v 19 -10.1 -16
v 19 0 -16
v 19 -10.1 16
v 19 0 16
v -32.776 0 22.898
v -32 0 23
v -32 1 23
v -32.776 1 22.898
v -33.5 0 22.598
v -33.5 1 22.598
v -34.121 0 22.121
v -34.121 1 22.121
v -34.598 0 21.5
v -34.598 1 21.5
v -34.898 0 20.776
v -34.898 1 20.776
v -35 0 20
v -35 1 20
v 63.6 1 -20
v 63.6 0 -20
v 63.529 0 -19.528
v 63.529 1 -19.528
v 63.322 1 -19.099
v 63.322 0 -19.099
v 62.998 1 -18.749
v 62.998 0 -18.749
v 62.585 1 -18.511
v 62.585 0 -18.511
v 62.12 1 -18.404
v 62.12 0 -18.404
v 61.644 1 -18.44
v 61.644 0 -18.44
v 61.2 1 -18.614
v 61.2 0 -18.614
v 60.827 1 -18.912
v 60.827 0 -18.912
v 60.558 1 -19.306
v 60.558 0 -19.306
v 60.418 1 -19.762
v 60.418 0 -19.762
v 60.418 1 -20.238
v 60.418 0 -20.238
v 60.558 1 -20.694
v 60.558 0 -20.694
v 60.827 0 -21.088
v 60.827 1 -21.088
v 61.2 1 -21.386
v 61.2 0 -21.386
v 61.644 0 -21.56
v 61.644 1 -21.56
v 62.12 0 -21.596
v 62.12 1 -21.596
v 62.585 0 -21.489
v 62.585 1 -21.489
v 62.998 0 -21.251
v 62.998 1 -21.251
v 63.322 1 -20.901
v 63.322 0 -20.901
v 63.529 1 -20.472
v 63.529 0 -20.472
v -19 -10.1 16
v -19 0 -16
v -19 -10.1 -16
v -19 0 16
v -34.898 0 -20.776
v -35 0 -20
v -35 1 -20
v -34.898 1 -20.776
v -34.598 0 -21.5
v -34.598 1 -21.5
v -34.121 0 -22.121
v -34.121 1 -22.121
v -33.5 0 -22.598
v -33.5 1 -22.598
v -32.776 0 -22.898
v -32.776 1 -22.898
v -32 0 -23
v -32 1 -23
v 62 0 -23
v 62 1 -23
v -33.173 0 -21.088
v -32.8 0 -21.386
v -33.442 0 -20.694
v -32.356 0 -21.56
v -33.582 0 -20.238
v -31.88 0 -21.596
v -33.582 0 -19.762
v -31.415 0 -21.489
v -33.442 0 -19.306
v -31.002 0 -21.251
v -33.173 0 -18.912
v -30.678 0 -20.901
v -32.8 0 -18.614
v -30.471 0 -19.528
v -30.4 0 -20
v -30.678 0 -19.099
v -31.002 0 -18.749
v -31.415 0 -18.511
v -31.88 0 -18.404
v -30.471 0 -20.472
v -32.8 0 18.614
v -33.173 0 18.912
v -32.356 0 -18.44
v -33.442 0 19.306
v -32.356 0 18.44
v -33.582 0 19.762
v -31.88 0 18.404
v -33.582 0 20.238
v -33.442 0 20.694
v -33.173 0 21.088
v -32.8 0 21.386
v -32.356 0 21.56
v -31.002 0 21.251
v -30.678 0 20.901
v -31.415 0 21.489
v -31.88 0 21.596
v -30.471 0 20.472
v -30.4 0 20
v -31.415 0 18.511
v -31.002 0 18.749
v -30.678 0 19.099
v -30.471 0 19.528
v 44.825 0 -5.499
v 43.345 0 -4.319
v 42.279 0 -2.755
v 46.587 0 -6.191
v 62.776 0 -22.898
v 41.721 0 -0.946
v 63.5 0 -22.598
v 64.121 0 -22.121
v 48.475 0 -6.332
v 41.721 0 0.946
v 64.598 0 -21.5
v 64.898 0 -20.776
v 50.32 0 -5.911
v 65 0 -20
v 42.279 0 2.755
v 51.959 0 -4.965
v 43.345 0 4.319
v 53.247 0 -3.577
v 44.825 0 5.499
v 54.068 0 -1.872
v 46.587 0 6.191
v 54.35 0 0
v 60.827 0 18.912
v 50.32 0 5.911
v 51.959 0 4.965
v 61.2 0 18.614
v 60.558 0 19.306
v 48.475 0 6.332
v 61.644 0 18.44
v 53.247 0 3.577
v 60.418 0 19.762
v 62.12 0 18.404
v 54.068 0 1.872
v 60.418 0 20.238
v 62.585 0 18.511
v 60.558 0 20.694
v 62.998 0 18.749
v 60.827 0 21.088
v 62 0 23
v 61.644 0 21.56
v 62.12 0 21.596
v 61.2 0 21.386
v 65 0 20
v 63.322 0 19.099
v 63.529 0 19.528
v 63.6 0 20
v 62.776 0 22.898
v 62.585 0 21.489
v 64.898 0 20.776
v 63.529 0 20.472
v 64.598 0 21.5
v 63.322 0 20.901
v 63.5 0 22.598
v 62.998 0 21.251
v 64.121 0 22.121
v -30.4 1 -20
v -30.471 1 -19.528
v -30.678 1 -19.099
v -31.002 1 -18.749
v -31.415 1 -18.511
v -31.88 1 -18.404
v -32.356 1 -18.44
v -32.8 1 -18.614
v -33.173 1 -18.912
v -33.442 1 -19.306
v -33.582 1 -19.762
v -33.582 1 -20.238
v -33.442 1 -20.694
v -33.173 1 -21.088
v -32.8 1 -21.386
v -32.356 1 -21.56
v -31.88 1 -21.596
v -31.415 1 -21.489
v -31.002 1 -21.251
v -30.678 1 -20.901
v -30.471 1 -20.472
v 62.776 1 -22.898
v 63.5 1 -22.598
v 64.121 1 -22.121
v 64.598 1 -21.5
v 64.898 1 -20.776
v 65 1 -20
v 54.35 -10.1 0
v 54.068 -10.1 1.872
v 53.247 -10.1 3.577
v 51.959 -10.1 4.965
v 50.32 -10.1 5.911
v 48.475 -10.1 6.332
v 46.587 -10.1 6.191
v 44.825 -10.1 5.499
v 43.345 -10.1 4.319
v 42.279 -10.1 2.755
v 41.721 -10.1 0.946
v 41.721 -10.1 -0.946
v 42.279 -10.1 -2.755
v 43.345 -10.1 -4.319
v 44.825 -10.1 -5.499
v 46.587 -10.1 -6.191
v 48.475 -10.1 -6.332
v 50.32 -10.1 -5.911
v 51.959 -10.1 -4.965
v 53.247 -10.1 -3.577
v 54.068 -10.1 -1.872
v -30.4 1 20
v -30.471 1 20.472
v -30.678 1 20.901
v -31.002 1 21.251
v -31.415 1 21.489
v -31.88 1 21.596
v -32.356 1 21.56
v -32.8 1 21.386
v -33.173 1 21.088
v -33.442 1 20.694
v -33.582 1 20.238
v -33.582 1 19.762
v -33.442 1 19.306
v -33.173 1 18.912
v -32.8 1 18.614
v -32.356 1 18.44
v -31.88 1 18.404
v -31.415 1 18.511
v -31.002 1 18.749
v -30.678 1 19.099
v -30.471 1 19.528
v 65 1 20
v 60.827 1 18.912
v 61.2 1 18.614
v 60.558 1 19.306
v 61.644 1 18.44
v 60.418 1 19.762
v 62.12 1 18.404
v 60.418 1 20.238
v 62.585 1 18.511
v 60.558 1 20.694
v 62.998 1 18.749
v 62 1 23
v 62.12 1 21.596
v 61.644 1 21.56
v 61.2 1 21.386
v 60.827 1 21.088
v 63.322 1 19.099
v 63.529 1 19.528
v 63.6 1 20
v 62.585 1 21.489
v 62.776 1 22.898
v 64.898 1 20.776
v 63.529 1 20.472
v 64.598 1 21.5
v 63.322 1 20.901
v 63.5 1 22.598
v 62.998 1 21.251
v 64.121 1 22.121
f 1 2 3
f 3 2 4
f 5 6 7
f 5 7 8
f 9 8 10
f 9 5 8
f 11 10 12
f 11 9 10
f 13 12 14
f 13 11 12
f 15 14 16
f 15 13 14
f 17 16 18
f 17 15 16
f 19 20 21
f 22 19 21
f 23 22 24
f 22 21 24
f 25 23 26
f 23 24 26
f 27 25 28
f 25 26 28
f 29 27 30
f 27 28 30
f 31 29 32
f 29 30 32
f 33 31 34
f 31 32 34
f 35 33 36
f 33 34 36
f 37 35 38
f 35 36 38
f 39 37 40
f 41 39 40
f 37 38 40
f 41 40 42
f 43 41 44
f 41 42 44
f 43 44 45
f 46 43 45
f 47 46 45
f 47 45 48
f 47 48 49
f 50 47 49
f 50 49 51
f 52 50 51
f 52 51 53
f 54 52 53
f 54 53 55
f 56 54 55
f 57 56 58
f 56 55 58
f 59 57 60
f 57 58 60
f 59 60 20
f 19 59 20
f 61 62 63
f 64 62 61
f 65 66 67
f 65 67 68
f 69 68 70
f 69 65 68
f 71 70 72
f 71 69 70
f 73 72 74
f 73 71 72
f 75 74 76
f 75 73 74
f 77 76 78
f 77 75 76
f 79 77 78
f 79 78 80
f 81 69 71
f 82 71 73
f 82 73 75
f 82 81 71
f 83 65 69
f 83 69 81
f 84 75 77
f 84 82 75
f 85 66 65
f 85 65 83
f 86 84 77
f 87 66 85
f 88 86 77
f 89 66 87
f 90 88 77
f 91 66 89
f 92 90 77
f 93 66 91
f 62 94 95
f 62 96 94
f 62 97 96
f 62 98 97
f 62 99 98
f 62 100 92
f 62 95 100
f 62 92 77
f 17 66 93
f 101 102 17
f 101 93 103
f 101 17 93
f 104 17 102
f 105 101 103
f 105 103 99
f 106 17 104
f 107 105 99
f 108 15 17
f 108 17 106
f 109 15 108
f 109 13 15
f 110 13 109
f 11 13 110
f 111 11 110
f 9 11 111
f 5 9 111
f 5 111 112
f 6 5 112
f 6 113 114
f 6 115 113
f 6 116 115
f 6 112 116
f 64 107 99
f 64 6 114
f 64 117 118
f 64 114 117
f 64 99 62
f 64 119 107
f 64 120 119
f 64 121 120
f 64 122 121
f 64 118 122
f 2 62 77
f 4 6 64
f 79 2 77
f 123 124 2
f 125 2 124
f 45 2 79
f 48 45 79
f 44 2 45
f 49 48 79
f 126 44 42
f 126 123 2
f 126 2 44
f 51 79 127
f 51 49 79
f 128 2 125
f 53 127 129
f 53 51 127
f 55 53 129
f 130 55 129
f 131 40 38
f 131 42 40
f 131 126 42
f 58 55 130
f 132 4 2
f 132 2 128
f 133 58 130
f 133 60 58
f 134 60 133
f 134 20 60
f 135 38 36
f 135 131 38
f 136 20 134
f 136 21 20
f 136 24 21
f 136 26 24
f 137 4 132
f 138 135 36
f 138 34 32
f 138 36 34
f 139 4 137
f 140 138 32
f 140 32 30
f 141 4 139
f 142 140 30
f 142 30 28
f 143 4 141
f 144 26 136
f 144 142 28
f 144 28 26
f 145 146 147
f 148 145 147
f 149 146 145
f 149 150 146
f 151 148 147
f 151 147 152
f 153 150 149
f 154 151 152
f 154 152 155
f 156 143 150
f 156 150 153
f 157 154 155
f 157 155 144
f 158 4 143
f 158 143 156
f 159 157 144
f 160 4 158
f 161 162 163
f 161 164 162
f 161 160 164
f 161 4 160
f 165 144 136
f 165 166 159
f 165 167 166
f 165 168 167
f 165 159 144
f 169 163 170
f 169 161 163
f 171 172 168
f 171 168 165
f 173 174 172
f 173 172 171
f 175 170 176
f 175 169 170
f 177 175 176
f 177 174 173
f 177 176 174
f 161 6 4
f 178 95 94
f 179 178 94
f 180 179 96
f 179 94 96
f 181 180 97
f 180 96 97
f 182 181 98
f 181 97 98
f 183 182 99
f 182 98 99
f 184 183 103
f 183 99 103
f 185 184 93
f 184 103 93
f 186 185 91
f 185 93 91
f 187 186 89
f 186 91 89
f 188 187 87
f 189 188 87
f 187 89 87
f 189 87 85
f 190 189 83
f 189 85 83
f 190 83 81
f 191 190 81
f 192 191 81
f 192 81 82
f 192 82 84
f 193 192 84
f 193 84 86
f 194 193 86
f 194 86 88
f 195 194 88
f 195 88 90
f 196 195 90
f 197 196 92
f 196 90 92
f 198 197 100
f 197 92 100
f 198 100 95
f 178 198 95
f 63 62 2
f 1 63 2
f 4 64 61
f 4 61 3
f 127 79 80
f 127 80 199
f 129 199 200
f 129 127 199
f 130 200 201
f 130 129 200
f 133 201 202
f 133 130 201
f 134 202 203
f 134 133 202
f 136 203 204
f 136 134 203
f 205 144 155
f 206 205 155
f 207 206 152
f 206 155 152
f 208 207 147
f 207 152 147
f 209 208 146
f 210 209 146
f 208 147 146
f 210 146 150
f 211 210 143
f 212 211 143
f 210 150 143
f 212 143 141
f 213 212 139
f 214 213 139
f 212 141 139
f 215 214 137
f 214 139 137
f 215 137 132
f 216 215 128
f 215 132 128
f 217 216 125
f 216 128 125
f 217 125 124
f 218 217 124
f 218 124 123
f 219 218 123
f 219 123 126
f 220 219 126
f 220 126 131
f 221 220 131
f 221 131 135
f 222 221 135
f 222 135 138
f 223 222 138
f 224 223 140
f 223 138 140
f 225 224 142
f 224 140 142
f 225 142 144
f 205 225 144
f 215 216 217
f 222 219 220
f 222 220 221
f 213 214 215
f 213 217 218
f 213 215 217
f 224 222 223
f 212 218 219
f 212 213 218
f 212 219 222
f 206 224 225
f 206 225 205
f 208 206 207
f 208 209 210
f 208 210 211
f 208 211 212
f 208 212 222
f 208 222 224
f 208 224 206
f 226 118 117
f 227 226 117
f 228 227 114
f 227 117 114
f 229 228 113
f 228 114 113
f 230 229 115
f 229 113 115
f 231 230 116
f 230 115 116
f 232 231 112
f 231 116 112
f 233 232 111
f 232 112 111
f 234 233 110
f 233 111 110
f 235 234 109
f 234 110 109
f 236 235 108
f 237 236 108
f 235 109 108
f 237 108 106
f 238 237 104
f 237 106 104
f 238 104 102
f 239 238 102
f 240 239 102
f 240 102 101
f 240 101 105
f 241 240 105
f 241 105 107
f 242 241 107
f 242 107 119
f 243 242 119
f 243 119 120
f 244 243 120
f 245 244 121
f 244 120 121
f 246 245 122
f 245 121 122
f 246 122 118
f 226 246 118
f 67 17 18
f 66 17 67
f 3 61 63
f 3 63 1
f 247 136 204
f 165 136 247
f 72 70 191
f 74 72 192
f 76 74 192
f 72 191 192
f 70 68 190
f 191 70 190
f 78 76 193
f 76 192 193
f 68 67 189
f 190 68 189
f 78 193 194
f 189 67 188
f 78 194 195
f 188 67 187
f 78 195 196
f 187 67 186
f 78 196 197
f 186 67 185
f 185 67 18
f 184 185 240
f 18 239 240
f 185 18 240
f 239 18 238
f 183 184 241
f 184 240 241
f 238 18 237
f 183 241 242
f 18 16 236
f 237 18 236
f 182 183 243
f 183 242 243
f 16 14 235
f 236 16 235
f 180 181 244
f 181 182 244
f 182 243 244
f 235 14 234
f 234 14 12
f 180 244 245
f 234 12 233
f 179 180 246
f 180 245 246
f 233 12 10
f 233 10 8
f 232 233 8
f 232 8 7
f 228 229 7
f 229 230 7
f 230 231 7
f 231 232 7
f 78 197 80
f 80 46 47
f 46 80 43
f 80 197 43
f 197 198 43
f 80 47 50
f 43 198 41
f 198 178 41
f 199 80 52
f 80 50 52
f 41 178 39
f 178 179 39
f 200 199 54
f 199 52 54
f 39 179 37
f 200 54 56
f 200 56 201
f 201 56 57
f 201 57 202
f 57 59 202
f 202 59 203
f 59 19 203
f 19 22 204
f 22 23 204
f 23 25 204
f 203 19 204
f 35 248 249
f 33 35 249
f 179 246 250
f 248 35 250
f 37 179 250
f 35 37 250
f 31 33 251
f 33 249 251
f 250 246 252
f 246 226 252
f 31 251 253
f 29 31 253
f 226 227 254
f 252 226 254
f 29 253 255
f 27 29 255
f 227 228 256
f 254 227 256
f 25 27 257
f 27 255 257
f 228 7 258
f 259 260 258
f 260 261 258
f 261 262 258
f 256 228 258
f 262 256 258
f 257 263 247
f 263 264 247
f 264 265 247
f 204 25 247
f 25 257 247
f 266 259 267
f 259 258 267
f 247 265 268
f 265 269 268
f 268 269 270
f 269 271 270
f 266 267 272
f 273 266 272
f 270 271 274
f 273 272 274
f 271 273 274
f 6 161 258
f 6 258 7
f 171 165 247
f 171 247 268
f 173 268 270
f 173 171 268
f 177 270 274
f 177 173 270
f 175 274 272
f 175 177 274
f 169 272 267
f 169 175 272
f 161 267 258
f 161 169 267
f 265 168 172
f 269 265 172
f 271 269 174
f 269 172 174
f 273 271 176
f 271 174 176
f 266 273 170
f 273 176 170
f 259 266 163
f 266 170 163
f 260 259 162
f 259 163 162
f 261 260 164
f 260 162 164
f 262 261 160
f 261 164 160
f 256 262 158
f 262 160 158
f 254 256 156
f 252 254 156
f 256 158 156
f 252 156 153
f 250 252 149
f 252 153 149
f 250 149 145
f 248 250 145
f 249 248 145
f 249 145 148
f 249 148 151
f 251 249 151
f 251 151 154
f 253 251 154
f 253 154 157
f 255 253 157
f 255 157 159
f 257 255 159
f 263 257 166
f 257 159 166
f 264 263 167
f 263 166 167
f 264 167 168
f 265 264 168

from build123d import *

# Parameters (mm, degrees)
F0_W     = 38
F0_H     = 32
F1_DEPTH = 10.1
F0_R     = 1.6
F0_R_2   = 6.35
F2_DEPTH = 1
F3_DEPTH = 10.1


with BuildPart() as f1:
    # F0 (on Front) → F1 (new body)
    with BuildSketch(Plane.XZ):
        Rectangle(F0_W, F0_H)
    extrude(amount=F1_DEPTH)

    # F0 (on Front) → F2 (join)
    with BuildSketch(Plane.XZ):
        with BuildLine():
            ThreePointArc((-35, -20), (-34.12132, -22.12132), (-32, -23))
            Line((-32, -23), (62, -23))
            ThreePointArc((62, -23), (64.12132, -22.12132), (65, -20))
            Line((65, -20), (65, 20))
            ThreePointArc((65, 20), (64.12132, 22.12132), (62, 23))
            Line((62, 23), (-32, 23))
            ThreePointArc((-32, 23), (-34.12132, 22.12132), (-35, 20))
            Line((-35, 20), (-35, -20))
        make_face()
        with Locations((-32, -20)):
            Circle(F0_R, mode=Mode.SUBTRACT)
        with Locations((62, -20)):
            Circle(F0_R, mode=Mode.SUBTRACT)
        Rectangle(F0_W, F0_H, mode=Mode.SUBTRACT)
        with Locations((-32, 20)):
            Circle(F0_R, mode=Mode.SUBTRACT)
        with Locations((48, 0)):
            Circle(F0_R_2, mode=Mode.SUBTRACT)
        with Locations((62, 20)):
            Circle(F0_R, mode=Mode.SUBTRACT)
        Rectangle(F0_W, F0_H)
        with Locations((48, 0)):
            Circle(F0_R_2)
    extrude(amount=-F2_DEPTH)

    # F0 (on Front) → F3 (join, through all)
    with BuildSketch(Plane.XZ):
        with Locations((48, 0)):
            Circle(F0_R_2)
    extrude(amount=F3_DEPTH)


solid = f1.part
